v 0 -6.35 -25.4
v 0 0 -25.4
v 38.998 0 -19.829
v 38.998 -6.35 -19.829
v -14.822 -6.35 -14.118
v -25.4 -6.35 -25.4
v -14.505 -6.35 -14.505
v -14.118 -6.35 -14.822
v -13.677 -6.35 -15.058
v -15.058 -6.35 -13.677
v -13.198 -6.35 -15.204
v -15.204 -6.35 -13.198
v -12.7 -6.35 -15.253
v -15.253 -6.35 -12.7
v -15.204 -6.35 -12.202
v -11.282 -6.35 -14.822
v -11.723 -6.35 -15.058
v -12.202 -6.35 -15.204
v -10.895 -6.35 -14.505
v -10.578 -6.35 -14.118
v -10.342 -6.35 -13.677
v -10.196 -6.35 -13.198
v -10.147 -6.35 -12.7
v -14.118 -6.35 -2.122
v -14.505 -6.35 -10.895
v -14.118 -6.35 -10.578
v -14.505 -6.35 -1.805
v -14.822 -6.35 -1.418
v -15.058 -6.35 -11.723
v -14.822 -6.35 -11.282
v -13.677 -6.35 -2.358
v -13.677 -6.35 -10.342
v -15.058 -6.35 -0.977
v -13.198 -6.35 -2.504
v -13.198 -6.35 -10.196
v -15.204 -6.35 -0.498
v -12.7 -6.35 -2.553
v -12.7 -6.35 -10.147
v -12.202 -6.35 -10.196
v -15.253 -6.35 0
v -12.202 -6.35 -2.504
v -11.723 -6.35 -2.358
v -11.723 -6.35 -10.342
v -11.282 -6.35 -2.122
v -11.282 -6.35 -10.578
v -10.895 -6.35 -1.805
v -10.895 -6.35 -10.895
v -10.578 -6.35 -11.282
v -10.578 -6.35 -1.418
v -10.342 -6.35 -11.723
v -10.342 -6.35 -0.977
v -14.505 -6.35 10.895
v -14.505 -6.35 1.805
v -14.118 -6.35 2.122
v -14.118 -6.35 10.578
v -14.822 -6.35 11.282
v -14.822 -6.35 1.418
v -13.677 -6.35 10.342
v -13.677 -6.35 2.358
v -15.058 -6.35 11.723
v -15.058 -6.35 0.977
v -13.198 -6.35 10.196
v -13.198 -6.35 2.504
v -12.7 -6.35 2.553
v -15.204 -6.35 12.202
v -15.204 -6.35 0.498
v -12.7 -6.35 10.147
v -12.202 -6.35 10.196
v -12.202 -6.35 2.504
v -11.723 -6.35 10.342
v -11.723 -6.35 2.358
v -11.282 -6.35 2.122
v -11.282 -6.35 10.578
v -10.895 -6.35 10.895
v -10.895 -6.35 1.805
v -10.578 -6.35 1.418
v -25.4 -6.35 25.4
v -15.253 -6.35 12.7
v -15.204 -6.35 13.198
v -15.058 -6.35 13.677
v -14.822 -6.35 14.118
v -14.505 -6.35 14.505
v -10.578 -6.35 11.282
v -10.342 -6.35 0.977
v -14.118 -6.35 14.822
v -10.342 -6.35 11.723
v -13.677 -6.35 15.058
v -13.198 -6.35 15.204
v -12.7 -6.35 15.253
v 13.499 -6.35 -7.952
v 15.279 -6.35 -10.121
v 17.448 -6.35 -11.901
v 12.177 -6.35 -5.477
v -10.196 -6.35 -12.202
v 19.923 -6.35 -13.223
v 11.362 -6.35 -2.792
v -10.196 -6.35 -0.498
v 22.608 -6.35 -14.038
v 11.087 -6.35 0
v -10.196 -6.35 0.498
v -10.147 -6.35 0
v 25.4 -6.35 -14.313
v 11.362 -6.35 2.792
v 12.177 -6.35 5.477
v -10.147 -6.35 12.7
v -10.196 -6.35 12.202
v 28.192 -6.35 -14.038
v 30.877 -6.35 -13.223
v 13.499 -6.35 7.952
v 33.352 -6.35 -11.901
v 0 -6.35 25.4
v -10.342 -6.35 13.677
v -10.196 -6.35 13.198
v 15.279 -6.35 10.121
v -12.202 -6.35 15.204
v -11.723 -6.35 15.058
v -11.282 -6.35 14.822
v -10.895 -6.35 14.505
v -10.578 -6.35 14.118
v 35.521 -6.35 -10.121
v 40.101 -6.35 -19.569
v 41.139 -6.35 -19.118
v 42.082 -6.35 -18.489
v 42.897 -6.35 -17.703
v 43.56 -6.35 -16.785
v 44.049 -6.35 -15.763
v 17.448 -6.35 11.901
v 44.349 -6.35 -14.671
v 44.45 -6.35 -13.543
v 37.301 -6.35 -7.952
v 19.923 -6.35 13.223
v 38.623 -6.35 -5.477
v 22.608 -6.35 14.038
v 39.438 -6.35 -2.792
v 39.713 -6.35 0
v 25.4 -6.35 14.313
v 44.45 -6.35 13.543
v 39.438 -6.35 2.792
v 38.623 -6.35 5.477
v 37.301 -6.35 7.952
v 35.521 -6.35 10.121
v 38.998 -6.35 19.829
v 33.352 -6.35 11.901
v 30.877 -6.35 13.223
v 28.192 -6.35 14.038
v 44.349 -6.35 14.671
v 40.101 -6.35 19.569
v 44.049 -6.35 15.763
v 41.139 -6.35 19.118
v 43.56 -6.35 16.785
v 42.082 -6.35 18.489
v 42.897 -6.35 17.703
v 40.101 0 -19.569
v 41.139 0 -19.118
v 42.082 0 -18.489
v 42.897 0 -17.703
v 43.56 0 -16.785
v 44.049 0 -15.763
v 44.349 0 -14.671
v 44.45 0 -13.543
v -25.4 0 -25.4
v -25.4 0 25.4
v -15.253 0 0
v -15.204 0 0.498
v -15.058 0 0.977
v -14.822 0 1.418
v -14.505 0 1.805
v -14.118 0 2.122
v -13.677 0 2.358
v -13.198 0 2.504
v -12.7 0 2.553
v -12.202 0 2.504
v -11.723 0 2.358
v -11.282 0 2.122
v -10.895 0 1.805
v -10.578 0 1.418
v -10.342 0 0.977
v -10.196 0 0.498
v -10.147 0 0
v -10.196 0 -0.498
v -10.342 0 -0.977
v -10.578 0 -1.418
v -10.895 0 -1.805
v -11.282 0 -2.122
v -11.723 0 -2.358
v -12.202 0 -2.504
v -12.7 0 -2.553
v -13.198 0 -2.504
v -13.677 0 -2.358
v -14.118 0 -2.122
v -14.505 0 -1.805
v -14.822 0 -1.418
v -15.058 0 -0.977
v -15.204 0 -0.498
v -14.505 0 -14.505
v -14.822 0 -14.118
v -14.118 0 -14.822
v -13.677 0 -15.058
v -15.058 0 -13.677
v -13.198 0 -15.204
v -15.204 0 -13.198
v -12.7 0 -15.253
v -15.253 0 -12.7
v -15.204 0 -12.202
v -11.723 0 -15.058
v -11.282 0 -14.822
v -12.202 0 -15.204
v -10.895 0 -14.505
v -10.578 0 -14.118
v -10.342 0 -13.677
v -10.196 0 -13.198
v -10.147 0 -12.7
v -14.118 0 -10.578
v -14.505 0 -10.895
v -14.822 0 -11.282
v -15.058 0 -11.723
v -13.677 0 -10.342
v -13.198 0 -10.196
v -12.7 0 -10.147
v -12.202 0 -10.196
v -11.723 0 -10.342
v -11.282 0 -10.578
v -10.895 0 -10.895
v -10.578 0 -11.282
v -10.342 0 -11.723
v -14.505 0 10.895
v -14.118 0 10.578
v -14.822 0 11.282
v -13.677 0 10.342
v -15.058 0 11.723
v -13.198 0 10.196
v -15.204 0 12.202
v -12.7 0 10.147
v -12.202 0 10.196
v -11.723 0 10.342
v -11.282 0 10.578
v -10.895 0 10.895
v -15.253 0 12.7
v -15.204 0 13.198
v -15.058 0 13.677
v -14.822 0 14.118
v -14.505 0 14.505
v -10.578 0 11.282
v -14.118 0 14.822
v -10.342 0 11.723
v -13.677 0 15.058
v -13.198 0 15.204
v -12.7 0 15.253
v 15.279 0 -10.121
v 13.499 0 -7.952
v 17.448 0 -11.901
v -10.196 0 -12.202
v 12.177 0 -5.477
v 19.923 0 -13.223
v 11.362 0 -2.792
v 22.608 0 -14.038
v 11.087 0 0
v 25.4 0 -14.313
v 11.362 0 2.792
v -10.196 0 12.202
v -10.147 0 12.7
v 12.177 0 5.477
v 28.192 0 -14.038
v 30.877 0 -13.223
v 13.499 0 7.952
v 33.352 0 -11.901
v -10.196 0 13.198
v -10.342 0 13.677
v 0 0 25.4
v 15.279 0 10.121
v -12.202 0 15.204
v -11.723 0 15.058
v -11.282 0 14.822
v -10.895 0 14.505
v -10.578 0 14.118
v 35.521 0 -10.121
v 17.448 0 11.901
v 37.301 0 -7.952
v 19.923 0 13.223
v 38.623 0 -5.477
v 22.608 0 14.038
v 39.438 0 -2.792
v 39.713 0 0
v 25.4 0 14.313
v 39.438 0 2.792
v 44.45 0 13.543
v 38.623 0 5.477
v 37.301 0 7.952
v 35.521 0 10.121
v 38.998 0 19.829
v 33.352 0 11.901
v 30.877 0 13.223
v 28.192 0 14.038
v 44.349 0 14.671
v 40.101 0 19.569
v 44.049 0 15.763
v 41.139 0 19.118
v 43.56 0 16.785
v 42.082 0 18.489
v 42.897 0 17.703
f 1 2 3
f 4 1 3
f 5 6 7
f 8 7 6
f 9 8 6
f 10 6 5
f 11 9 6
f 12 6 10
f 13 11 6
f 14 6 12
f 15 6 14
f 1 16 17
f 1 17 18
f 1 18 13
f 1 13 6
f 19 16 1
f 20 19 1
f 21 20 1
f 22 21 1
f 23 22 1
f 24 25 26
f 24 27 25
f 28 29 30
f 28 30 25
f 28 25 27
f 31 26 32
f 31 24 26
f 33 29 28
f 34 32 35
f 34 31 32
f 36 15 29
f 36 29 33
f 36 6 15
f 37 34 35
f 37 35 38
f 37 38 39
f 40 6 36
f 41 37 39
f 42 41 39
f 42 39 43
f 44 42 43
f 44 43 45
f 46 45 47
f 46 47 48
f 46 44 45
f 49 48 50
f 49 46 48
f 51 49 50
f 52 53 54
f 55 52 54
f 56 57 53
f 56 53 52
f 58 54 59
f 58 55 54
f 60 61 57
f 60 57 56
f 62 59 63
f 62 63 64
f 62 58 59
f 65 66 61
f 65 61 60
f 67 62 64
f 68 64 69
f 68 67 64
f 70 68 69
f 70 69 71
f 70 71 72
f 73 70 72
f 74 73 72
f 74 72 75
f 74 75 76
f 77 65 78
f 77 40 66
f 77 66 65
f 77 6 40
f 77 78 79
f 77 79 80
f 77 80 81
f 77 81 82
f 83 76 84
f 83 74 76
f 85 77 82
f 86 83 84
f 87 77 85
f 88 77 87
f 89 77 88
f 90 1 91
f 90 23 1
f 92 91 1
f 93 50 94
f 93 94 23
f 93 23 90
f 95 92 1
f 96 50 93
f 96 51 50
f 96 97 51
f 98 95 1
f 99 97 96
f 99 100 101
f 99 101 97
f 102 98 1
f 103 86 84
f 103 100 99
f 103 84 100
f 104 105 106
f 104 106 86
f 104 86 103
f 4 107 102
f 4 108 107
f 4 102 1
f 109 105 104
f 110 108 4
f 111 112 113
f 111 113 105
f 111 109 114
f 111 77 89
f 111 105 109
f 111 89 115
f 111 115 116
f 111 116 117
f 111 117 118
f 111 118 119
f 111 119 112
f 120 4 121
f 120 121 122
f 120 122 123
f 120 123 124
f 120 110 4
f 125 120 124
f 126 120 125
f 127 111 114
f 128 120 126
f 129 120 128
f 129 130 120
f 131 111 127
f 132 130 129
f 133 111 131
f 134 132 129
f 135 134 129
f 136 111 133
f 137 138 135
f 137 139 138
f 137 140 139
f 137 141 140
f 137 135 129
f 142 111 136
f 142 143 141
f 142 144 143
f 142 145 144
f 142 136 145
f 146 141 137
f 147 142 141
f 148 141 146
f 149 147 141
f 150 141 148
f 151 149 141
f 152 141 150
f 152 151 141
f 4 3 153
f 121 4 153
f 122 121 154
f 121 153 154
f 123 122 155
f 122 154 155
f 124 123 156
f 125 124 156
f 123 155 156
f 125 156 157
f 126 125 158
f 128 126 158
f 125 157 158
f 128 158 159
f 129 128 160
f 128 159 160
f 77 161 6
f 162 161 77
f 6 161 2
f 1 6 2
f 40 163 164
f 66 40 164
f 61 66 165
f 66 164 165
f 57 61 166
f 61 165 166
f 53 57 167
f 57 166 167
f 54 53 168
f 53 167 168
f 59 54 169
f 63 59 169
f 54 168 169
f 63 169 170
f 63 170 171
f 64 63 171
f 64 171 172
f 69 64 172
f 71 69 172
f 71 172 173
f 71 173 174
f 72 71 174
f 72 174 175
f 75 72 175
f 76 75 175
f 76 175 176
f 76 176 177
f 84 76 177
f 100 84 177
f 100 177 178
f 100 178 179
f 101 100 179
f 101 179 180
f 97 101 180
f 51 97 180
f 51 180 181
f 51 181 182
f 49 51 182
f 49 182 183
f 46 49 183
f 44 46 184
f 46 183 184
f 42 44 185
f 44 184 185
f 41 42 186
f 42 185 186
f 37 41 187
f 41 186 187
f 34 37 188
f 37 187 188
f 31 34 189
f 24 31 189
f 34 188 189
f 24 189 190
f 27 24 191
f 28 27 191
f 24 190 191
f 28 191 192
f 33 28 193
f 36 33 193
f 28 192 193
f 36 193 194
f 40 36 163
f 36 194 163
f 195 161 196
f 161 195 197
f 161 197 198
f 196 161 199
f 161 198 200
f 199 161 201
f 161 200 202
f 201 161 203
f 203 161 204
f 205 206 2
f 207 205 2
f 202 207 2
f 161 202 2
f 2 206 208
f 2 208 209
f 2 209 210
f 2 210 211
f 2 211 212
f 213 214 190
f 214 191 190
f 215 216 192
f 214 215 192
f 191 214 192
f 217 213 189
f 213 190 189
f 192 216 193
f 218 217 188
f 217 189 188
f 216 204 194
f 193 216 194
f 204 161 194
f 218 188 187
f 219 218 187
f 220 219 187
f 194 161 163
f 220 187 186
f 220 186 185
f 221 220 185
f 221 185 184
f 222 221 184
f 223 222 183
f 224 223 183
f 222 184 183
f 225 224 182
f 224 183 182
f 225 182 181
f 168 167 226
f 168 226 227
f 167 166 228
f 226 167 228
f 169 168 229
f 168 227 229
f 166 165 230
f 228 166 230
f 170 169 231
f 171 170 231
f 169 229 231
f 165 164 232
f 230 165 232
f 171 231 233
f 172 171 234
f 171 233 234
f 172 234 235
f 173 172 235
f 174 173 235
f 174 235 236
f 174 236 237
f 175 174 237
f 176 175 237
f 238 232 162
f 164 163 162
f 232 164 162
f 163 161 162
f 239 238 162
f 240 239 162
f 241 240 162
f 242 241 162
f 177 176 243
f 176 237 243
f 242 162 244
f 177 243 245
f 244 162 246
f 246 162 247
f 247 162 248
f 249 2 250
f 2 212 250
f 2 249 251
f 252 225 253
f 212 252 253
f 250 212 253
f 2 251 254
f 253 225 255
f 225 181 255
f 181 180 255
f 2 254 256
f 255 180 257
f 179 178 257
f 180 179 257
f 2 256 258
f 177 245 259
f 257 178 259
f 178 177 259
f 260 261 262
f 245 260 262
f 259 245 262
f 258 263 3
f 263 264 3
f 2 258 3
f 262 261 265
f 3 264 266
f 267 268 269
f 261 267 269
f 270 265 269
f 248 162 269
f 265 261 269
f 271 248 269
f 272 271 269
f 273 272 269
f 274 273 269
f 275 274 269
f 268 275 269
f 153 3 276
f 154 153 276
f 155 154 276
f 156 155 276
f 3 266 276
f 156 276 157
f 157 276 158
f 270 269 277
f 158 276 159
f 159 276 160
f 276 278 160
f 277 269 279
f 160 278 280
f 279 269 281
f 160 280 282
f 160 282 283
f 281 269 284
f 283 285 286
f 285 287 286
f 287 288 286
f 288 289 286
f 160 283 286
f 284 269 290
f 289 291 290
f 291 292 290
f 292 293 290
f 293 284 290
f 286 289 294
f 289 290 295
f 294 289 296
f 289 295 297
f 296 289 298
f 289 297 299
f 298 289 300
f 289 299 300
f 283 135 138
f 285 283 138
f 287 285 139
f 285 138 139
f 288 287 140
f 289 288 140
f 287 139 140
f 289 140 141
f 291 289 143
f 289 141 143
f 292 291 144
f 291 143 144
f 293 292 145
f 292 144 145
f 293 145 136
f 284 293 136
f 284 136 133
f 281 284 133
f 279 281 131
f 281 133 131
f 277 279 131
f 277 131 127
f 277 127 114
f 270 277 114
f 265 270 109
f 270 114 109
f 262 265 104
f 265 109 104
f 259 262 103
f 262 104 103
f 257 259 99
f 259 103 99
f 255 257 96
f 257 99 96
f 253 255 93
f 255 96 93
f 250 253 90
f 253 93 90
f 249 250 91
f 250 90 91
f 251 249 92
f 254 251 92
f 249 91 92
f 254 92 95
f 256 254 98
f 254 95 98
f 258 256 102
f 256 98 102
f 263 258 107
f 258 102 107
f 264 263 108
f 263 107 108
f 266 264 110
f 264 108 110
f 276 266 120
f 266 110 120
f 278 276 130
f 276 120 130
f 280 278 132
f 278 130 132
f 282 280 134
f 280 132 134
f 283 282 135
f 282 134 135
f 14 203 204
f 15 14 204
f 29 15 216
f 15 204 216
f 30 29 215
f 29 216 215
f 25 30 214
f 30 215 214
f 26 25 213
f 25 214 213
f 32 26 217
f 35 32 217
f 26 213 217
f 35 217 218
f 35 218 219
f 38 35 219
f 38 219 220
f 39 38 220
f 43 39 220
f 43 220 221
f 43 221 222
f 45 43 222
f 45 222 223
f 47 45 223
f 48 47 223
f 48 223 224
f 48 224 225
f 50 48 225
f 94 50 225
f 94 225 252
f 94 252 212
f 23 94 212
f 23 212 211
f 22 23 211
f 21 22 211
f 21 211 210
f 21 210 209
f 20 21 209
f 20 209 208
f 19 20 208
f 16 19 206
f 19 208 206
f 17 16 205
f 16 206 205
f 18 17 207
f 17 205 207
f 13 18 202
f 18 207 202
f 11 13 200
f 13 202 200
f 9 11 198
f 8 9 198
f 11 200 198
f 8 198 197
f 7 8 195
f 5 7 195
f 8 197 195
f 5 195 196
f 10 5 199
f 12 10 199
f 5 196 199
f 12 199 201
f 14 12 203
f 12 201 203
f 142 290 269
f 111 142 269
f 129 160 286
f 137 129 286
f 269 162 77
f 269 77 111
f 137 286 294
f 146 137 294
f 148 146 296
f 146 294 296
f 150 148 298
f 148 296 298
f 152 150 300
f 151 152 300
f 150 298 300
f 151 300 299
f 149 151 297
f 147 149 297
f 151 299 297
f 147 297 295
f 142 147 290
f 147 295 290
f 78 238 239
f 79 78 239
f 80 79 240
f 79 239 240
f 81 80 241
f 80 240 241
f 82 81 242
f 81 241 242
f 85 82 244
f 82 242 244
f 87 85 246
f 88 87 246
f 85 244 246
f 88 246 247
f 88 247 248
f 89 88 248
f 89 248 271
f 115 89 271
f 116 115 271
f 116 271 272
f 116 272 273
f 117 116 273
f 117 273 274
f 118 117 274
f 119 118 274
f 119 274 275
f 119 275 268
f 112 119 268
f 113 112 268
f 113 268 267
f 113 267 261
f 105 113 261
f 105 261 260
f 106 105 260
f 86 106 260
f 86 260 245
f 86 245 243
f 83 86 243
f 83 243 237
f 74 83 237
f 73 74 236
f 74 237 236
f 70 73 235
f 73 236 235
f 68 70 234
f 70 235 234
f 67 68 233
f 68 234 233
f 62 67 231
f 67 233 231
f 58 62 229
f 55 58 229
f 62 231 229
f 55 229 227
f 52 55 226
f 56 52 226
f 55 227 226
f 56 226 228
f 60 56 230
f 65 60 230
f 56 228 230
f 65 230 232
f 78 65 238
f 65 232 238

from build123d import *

# Parameters (mm, degrees)
F0_W     = 25.4
F0_H     = 50.8
F1_DEPTH = 6.35
F3_D     = 5.1054
F3_DEPTH = 12.7
F3_TIP   = 1.5338169022
F4_R     = 14.3129
F5_DEPTH = 6.35


with BuildPart() as f1:
    # F0 (on Front) → F1 (new body)
    with BuildSketch(Plane.XZ):
        with Locations((-12.7, 0)):
            Rectangle(F0_W, F0_H)
        with BuildLine():
            Line((38.9980256121, 19.828853484), (0, 25.4))
            Line((0, 25.4), (0, -25.4))
            Line((0, -25.4), (38.9980256121, -19.828853484))
            ThreePointArc((38.9980256121, -19.828853484), (42.8971326142, -17.7032052569), (44.45, -13.5426741992))
            Line((44.45, -13.5426741992), (44.45, 0))
            Line((44.45, 0), (44.45, 13.5426741992))
            ThreePointArc((44.45, 13.5426741992), (42.8971326142, 17.7032052569), (38.9980256121, 19.828853484))
        make_face()
    extrude(amount=F1_DEPTH)

    # F3
    with Locations(Plane.XZ.offset(6.35)):
        with Locations((-12.7, 12.7), (-12.7, 0), (-12.7, -12.7)):
            Hole(F3_D / 2, depth=F3_DEPTH)
            with Locations((0, 0, -(F3_DEPTH + F3_TIP / 2))):  # 118° drill point
                Cone(0, F3_D / 2, F3_TIP, mode=Mode.SUBTRACT)

    # F4 (on face) → F5 (cut, through all)
    with BuildSketch(Plane.XZ.offset(6.35)):
        with Locations((25.4, 0)):
            Circle(F4_R)
    extrude(amount=-F5_DEPTH, mode=Mode.SUBTRACT)


solid = f1.part
